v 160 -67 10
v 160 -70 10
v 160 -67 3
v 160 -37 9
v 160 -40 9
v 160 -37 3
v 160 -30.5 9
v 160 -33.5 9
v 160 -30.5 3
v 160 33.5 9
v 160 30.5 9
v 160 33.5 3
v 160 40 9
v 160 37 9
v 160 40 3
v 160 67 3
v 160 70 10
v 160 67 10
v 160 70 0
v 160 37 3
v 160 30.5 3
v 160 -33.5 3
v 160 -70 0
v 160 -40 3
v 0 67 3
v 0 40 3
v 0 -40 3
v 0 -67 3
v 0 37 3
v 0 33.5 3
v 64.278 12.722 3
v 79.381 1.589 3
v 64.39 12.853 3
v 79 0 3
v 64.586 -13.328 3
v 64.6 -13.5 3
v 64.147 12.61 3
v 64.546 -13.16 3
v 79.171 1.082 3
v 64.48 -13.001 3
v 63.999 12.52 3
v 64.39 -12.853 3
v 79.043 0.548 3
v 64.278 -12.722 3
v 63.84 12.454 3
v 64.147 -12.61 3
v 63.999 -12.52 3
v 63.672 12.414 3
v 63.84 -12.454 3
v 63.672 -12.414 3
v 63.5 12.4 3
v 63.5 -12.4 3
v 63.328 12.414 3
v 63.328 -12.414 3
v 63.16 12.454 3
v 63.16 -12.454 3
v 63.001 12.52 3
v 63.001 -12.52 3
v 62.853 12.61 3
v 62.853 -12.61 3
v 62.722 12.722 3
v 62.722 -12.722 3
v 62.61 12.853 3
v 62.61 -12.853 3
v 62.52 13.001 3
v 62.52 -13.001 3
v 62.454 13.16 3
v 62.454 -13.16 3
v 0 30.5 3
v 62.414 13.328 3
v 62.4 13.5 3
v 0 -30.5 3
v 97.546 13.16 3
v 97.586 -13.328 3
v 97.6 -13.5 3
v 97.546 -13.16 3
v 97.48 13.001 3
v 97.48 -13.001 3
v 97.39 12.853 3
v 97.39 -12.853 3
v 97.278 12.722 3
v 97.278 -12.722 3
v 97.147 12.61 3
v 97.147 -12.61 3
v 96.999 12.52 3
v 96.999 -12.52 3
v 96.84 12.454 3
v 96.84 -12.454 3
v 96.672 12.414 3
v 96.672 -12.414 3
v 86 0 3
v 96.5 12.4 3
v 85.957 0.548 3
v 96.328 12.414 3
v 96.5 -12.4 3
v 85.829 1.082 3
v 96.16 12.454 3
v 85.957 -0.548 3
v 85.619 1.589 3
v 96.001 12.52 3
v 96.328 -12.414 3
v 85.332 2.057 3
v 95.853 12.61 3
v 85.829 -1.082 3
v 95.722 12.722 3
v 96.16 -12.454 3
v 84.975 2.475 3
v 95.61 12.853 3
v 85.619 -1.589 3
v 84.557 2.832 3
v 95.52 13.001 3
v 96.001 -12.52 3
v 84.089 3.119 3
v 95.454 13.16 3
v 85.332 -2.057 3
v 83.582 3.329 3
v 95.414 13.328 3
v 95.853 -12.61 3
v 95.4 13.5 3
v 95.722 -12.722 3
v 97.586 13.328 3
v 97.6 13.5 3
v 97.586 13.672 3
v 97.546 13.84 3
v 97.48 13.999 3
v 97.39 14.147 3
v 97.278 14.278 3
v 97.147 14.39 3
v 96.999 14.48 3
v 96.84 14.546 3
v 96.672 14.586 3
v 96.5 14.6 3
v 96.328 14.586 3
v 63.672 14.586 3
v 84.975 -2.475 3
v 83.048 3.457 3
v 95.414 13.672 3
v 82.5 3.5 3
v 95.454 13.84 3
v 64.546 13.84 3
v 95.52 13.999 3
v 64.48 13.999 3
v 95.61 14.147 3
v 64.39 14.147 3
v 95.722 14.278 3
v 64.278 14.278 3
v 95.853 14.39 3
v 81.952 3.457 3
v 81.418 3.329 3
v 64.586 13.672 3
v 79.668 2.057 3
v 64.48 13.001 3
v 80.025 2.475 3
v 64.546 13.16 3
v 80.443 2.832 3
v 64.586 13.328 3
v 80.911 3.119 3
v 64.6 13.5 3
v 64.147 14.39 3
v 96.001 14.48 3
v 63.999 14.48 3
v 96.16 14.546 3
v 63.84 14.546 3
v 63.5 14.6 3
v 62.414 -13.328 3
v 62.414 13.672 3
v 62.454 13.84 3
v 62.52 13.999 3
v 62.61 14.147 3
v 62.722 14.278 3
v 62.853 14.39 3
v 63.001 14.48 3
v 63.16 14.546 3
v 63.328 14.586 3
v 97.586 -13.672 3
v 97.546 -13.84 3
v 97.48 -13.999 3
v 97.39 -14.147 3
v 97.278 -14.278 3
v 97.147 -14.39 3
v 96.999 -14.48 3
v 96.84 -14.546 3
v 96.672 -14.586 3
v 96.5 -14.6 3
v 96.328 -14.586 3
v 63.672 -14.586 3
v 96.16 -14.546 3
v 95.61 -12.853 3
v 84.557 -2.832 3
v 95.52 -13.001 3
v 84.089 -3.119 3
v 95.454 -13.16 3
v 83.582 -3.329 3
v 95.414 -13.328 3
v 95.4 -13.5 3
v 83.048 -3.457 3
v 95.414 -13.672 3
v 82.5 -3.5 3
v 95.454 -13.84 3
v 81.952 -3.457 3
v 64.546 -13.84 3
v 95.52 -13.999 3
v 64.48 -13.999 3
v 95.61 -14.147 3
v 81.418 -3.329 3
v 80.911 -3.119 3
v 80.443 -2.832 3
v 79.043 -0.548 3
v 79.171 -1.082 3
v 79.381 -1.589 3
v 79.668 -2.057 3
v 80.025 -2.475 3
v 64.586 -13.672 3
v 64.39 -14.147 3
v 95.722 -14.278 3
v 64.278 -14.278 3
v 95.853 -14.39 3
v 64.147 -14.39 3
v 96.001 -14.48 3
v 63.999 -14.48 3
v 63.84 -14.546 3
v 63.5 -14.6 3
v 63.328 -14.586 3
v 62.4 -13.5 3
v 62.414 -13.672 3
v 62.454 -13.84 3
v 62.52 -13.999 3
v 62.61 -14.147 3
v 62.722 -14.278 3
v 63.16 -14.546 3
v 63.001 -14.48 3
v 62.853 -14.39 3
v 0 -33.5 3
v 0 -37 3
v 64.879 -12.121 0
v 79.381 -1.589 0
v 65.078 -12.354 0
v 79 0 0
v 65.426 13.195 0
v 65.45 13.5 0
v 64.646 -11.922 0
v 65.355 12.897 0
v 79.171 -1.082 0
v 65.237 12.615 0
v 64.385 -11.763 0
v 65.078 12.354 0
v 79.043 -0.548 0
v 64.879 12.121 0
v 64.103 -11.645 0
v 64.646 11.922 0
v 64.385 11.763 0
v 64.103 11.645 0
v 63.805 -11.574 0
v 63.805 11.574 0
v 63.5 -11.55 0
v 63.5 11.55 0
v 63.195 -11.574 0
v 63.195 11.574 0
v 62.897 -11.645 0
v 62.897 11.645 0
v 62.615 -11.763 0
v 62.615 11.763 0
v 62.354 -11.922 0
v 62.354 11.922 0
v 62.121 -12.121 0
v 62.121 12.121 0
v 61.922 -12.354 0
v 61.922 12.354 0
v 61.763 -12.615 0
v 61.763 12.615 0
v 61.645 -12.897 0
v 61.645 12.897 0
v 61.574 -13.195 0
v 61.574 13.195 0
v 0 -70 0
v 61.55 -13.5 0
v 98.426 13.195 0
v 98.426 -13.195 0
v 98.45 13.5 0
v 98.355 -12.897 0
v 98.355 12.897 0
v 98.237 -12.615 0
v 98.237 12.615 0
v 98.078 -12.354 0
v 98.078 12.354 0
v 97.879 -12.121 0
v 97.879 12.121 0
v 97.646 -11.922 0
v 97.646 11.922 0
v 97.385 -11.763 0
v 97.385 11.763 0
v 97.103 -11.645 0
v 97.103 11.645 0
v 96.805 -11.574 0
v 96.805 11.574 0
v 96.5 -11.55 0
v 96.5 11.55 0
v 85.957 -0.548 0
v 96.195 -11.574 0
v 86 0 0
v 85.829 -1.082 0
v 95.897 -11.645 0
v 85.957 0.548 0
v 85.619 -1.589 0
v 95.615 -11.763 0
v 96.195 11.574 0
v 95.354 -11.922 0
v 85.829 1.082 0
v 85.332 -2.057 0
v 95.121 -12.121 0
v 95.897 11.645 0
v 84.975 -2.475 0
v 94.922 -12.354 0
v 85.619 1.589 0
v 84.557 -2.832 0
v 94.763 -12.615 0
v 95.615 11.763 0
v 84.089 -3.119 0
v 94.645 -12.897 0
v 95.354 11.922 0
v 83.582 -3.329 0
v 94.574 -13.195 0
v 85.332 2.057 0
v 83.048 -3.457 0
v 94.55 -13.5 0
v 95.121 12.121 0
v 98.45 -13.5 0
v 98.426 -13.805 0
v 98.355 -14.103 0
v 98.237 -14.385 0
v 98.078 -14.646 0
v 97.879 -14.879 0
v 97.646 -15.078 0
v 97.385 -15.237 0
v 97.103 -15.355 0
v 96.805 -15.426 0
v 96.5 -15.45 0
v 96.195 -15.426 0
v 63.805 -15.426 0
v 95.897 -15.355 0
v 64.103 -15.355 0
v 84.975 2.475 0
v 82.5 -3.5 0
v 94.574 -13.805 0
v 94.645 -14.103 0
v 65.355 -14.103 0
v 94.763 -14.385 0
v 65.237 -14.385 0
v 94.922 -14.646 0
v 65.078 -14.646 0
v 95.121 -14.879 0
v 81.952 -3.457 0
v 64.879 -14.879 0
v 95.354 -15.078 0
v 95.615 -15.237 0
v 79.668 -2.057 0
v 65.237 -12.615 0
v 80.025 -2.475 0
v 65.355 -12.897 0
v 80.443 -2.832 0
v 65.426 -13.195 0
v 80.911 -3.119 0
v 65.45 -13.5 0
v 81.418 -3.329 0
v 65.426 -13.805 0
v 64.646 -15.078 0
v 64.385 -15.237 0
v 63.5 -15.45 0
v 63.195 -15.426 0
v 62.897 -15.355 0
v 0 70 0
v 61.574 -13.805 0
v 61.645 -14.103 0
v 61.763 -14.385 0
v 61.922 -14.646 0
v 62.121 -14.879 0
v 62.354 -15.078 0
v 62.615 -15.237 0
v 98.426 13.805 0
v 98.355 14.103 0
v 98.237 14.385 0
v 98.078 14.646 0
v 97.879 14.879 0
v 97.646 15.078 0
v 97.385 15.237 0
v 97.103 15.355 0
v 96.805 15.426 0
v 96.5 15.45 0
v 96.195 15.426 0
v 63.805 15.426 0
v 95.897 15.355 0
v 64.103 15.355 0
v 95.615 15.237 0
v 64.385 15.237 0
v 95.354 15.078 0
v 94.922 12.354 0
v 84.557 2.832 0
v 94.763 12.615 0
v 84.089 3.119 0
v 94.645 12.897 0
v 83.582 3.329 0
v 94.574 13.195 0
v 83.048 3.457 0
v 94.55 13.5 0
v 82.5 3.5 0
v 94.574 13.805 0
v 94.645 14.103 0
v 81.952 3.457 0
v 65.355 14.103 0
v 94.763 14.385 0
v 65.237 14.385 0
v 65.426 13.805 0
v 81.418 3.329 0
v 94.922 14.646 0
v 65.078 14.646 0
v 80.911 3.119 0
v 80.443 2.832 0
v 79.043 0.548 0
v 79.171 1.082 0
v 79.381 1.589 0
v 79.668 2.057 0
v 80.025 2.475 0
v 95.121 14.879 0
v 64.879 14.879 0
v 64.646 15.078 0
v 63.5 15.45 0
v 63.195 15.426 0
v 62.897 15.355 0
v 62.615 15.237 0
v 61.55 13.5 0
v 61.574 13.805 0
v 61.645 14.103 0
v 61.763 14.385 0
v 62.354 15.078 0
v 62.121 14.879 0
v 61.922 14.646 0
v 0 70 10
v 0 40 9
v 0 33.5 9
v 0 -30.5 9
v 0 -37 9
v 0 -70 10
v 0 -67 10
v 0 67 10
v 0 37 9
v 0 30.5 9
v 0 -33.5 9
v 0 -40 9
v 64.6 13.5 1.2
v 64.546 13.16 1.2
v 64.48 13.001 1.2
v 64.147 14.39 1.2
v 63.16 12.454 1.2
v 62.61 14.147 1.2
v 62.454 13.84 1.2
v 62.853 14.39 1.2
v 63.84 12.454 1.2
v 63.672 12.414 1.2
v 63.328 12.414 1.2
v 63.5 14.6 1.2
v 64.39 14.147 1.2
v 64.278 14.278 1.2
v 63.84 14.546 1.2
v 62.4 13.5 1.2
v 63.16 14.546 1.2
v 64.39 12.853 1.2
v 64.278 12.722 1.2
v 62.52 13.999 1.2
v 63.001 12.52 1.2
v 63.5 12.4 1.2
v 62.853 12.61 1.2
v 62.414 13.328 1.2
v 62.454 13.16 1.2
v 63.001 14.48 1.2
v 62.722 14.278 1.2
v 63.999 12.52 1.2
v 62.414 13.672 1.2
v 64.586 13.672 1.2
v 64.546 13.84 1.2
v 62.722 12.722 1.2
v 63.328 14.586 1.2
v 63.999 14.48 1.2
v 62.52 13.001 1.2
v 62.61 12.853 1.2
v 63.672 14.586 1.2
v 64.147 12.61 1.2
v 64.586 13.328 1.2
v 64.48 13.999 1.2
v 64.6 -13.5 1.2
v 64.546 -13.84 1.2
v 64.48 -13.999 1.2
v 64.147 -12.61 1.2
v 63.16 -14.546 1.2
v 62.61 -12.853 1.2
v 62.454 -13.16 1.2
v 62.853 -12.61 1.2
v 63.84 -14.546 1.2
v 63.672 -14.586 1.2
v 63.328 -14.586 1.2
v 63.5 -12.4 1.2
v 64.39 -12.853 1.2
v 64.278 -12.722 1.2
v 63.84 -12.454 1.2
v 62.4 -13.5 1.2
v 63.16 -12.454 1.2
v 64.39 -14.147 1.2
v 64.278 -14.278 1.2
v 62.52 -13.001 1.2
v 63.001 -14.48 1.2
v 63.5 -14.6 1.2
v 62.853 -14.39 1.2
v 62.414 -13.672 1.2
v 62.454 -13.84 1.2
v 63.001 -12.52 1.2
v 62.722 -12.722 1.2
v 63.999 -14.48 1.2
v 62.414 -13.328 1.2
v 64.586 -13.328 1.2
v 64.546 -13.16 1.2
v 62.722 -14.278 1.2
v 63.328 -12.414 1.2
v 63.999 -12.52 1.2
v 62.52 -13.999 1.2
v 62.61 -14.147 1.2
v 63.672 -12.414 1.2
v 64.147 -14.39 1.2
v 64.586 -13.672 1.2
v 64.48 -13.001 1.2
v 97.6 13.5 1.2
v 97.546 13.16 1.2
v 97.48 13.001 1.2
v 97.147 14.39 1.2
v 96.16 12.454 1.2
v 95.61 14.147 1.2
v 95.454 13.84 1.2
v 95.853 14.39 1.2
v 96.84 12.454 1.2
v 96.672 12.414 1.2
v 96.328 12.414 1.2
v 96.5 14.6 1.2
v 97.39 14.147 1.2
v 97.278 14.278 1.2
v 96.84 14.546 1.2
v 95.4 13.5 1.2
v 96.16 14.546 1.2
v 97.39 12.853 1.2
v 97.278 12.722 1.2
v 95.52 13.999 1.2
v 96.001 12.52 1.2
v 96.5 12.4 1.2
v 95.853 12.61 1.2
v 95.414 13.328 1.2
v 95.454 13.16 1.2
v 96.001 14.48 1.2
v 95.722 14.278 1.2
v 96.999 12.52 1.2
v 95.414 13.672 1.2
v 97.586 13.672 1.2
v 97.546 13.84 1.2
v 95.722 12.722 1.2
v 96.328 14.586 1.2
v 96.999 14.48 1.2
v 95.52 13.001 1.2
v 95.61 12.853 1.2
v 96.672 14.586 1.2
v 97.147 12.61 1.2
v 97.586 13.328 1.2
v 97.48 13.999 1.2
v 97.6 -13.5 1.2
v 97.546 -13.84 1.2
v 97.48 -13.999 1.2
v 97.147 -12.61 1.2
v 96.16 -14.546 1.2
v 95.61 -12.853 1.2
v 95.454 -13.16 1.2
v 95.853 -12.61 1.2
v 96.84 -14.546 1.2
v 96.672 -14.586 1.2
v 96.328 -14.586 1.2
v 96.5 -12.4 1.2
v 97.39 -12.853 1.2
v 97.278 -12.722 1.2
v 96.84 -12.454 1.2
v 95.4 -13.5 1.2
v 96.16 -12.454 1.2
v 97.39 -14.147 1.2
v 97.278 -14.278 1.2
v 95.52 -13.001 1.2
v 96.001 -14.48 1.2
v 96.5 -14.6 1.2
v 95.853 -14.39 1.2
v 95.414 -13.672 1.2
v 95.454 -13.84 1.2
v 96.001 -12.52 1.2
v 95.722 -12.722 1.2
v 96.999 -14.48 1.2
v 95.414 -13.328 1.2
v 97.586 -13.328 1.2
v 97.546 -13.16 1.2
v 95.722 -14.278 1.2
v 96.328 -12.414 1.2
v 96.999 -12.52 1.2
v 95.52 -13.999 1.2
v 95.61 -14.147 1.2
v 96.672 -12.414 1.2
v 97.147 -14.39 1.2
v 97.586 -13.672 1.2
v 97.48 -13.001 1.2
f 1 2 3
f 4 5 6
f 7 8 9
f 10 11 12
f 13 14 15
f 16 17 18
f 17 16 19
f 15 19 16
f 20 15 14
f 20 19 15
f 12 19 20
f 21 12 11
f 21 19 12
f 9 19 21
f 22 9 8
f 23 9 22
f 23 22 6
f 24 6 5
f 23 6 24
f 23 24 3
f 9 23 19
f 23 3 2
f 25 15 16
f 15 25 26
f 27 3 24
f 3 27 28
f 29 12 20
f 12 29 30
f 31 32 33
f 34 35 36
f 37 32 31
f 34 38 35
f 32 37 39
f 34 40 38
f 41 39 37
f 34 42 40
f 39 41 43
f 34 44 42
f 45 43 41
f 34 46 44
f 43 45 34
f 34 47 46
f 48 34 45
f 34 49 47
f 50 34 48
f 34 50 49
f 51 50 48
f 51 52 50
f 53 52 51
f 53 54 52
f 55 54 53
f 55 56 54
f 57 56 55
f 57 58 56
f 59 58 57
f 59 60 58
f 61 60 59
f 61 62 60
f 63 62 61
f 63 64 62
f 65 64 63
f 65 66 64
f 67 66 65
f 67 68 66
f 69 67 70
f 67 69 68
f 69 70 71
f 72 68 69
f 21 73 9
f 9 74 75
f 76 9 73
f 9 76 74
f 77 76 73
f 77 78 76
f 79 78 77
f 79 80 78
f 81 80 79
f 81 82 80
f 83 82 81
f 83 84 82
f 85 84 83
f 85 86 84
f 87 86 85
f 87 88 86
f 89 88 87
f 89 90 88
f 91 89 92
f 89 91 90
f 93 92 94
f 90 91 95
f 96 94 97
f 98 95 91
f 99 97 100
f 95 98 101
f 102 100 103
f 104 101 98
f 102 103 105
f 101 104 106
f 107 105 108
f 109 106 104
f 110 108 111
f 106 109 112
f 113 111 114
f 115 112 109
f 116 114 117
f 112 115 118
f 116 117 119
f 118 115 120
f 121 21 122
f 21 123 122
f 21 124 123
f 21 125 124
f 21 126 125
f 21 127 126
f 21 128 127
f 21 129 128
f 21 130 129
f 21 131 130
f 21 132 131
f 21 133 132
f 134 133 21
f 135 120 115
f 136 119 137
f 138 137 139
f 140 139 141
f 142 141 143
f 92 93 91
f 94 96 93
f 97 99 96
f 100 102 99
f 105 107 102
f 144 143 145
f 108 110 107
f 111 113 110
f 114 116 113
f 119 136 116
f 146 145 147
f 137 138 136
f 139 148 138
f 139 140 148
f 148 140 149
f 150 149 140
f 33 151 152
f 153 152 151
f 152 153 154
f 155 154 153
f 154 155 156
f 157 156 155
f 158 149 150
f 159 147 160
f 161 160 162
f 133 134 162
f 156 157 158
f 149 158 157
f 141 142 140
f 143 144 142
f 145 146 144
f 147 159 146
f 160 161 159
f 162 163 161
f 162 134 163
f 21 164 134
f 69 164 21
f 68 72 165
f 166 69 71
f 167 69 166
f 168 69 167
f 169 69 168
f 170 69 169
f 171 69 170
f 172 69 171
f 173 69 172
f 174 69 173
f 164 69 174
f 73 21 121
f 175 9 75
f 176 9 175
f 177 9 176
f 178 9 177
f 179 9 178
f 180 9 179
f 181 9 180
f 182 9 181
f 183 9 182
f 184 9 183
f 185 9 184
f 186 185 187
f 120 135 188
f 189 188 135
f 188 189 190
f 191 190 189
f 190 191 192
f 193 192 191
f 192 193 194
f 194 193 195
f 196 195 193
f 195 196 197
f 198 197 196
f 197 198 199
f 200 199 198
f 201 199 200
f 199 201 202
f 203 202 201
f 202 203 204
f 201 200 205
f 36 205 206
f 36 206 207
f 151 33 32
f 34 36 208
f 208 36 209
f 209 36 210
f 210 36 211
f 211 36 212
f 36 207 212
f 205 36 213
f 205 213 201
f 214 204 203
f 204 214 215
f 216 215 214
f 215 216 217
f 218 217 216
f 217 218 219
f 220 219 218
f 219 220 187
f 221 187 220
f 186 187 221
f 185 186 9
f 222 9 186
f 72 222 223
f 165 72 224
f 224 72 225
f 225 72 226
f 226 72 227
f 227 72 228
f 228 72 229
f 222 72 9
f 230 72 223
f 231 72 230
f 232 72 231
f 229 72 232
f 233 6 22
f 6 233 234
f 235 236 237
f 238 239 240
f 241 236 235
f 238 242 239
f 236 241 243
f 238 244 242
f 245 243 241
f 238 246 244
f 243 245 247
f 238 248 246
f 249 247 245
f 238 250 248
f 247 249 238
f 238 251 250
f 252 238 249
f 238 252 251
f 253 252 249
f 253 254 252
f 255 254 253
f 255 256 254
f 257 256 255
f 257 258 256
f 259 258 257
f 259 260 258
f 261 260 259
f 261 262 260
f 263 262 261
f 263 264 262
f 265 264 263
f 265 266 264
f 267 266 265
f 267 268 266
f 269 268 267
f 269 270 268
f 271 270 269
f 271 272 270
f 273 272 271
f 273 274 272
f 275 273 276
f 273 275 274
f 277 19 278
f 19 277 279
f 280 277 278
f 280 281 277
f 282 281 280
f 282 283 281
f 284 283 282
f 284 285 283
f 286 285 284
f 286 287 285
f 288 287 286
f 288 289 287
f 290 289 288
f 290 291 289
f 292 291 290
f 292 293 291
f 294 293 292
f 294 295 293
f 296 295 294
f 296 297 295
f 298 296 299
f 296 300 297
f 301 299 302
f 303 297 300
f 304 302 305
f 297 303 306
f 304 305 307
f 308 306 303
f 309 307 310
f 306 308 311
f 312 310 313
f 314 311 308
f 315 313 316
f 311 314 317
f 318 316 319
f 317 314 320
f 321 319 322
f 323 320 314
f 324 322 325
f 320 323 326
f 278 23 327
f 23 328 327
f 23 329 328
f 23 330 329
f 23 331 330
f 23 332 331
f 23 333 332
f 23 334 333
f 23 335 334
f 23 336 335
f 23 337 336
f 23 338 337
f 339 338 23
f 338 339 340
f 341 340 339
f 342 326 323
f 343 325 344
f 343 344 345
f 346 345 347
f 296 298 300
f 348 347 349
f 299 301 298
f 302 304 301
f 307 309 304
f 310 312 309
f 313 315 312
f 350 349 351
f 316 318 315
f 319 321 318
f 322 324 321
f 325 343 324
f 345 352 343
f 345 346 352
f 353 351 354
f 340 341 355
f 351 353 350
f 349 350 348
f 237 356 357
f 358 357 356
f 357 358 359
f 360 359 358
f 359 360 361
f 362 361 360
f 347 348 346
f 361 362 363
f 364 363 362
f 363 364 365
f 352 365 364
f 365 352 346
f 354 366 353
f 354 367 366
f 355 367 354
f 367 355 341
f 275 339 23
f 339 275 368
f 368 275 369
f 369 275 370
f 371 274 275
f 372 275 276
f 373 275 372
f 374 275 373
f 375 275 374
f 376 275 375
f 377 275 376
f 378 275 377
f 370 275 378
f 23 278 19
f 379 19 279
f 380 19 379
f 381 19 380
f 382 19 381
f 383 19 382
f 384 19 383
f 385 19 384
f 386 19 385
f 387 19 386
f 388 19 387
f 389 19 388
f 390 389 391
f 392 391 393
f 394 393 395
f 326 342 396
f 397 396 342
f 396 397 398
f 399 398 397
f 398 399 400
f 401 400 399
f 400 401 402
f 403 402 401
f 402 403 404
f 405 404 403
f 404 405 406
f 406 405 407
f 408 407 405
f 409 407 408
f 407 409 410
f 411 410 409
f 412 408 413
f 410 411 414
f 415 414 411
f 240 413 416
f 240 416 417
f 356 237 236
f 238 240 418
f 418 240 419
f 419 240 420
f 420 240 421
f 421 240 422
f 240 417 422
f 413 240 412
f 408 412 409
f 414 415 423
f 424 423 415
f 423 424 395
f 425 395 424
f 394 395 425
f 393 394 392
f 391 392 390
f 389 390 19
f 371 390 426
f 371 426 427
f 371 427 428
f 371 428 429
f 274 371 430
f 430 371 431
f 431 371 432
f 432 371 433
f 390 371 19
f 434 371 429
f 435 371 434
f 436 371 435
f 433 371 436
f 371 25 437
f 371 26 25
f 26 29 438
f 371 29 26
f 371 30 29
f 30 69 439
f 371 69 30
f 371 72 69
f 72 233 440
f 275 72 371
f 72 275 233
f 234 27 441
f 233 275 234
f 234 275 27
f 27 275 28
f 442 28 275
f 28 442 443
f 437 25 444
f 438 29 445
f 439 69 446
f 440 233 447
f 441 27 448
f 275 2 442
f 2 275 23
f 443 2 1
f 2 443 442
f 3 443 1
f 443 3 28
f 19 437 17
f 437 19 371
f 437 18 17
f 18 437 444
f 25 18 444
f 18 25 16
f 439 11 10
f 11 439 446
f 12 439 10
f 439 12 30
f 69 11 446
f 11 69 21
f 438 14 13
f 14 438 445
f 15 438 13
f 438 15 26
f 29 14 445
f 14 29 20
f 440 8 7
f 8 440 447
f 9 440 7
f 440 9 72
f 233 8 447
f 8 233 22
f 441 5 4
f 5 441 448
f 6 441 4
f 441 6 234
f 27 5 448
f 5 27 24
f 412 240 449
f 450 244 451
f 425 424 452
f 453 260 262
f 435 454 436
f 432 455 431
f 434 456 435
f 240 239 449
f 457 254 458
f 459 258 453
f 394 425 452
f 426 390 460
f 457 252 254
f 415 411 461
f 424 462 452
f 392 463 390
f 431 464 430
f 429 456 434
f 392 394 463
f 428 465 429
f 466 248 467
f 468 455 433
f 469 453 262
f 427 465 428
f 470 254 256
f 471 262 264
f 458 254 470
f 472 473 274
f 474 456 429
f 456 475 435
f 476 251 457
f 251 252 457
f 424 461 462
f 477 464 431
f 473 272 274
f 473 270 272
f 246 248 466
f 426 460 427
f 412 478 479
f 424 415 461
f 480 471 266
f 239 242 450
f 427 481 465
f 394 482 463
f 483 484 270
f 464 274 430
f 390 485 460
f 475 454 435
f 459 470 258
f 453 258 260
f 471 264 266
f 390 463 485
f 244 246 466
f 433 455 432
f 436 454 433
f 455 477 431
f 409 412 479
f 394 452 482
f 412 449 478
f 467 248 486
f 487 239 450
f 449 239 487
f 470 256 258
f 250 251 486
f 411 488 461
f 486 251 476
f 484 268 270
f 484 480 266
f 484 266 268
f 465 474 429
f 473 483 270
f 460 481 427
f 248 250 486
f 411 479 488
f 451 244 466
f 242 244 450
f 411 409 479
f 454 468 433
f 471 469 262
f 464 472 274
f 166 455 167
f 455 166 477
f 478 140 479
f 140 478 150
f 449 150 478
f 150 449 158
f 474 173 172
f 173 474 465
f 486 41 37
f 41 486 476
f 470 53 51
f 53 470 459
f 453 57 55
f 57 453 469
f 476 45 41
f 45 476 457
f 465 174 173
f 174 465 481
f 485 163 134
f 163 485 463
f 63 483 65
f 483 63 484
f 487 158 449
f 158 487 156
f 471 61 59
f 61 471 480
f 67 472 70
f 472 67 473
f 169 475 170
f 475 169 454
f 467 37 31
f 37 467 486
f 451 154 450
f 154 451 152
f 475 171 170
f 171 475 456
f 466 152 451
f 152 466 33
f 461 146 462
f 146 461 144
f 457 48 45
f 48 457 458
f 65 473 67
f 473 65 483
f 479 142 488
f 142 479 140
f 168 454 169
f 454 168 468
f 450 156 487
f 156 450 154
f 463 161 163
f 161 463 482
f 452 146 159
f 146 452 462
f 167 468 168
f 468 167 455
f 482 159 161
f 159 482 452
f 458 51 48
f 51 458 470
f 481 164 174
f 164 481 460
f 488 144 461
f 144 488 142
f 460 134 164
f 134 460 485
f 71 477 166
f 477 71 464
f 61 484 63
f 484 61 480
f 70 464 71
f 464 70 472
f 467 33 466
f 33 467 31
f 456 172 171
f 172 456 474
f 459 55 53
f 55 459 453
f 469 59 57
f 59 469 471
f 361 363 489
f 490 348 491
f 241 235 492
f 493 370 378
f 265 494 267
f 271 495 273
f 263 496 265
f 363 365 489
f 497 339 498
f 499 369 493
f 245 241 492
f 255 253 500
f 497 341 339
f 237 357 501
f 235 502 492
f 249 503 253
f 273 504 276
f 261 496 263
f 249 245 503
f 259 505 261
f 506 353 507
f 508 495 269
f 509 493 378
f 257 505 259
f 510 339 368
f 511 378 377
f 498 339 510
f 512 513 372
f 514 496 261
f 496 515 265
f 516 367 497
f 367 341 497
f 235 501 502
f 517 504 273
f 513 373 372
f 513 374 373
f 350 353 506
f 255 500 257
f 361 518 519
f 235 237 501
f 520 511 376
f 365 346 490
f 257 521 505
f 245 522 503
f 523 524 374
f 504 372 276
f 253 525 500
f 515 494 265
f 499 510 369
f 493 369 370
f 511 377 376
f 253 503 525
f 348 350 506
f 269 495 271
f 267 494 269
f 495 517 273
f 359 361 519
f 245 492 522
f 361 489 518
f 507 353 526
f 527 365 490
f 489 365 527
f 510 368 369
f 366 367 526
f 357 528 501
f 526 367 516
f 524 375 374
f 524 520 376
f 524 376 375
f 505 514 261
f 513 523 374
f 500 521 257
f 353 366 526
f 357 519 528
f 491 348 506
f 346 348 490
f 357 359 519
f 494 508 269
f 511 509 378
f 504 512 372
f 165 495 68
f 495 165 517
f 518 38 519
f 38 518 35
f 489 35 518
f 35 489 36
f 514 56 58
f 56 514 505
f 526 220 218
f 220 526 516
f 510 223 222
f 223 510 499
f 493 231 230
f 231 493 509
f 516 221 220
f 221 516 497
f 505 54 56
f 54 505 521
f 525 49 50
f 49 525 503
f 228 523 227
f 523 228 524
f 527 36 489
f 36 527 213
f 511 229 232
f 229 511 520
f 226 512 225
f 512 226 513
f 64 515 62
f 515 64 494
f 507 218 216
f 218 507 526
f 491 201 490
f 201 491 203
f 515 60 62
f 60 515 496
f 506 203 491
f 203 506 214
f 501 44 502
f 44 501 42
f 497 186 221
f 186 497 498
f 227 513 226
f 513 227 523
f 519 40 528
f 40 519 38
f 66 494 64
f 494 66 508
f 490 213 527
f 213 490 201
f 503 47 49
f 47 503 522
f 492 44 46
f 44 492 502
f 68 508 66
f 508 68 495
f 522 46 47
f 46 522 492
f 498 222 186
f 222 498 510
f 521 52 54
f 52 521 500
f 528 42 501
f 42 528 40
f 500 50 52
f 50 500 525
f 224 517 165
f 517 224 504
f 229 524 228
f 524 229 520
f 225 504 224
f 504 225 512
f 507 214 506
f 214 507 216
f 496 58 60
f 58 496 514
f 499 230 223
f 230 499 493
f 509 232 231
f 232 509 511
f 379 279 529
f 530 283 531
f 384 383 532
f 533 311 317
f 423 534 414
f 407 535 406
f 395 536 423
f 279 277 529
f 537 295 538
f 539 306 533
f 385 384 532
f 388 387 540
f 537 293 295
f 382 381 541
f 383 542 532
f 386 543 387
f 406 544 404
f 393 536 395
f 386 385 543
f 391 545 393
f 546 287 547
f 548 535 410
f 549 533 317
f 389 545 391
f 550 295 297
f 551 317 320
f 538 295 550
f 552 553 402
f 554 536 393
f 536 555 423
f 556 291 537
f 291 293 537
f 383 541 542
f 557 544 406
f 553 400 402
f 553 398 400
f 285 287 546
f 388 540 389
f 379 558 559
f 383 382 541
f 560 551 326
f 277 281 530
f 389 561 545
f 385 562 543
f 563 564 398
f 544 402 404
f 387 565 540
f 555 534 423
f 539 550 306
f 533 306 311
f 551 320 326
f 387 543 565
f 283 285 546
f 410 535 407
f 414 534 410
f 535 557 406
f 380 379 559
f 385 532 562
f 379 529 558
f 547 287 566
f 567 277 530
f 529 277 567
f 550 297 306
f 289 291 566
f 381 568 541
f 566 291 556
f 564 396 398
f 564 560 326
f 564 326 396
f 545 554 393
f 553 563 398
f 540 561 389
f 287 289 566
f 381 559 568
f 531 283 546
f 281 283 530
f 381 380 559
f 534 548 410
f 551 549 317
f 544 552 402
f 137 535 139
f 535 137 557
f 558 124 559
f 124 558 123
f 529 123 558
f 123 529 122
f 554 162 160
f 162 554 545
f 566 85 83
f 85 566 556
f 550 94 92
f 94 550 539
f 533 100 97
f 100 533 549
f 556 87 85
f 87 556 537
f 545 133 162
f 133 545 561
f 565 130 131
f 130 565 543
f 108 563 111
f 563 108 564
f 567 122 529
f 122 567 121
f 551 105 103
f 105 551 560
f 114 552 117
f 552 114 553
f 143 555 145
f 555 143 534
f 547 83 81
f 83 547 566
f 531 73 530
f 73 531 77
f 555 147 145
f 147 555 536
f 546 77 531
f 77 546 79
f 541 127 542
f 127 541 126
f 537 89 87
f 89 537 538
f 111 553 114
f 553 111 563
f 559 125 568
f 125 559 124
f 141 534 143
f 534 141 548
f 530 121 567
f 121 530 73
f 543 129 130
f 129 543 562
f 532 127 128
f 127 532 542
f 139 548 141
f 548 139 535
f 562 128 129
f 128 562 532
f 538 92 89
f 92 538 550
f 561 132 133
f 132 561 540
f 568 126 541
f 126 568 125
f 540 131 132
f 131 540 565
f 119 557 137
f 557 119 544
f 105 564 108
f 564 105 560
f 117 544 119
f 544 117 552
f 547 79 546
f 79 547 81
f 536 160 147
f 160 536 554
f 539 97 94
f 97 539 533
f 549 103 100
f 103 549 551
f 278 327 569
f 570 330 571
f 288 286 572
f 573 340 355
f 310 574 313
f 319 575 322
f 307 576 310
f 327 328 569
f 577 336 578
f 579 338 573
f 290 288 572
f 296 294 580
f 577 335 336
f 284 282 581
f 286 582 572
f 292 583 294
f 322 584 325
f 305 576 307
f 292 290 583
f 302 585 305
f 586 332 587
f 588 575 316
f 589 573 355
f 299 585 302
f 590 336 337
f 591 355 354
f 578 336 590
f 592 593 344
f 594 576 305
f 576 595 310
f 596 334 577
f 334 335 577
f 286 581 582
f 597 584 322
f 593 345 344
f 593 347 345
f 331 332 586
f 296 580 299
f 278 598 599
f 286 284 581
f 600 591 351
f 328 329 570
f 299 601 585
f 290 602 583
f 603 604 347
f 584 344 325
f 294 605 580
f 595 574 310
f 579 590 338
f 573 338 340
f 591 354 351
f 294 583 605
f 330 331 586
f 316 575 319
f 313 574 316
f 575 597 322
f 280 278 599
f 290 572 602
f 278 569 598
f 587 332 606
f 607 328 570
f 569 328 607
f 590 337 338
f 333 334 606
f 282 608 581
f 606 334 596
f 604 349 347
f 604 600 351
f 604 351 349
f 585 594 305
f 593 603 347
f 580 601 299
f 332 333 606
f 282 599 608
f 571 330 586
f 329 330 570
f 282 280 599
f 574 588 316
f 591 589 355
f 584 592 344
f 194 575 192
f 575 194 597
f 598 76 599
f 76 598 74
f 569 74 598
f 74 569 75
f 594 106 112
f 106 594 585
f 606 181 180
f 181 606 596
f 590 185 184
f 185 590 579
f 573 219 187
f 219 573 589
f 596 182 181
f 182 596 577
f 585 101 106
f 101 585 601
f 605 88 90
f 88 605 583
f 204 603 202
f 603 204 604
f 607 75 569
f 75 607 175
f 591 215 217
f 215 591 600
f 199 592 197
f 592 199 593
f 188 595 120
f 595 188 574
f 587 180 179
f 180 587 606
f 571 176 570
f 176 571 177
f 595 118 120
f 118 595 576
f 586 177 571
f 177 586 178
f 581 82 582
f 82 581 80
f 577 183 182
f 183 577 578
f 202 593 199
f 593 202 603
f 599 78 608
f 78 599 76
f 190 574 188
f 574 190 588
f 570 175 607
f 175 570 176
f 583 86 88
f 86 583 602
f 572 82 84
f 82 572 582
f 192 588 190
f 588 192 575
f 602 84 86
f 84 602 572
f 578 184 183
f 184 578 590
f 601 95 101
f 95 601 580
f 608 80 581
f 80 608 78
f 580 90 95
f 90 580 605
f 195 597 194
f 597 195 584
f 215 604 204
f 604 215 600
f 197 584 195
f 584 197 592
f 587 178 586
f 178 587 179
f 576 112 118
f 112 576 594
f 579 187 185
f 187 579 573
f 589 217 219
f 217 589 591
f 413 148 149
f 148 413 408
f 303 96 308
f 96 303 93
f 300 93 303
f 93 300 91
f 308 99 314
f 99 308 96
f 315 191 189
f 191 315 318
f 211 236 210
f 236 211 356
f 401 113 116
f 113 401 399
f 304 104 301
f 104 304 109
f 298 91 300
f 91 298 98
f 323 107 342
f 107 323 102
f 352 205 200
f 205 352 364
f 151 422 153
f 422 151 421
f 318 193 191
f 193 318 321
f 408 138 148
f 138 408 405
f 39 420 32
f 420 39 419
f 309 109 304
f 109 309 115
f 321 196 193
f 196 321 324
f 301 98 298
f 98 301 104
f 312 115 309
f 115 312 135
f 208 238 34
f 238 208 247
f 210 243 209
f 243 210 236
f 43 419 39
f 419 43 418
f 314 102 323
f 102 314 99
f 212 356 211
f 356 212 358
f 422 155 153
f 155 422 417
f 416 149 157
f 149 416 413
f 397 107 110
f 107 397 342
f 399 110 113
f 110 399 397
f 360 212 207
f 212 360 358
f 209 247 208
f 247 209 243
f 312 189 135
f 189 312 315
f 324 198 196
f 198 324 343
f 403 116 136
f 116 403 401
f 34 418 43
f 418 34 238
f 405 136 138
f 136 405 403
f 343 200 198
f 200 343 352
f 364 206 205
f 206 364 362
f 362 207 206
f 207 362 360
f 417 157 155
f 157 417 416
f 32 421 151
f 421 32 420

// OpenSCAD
$fn = 40;

camera_bb_width = 105;
camera_bb_depth = 60;
camera_bb_height = 64;

rpi_bb_width = 90;
rpi_bb_depth = 58;
rpi_bb_height = 20;

poe_bb_width = 75;
poe_bb_depth = 45;
poe_bb_height = 21;

camera_body_width = 105; //TODO incorrect
camera_body_depth = 52;
camera_body_height = 64;

camera_inset = 10;

camera_lens_width = 105; //TODO incorrect
camera_lens_depth = 60;
camera_lens_height = 60;

wall_thickness = 3;

baseplate_width = 160;
baseplate_depth = 100;
baseplate_height = wall_thickness;

clip_height = 20;
clip_spacing = 0.5;

sideclip_depth = clip_height;
sideclip_height = 10;

topclip_width = baseplate_width;
topclip_depth = baseplate_depth + 2 * sideclip_depth + 2 * wall_thickness;
topclip_height = 30;

module mountinghole() {
  mountinghole_d = 2.2;
  mountinghole_head_d = 3.9;
  mountinghole_head_height = 1.2;
  cylinder(d1 = mountinghole_head_d, d2 = mountinghole_d, h = mountinghole_head_height);
  translate([0, 0, mountinghole_head_height]) cylinder(d = mountinghole_d, h = 10);
}

module baseplate() {
  width = baseplate_width;
  depth = baseplate_depth;
  height = baseplate_height;
  translate([0, - depth / 2, 0]) cube([width, depth, height]);
}

module sideclip() {
  width = baseplate_width;
  height = sideclip_height;
  depth = sideclip_depth;
  translate([0, - baseplate_depth / 2 - depth, 0]) {
    cube([baseplate_width, depth, wall_thickness]);
    cube([baseplate_width, wall_thickness, height]);
  }
}

module mountingclip() {
  width = baseplate_width;
  depth = wall_thickness;
  height = 2 * wall_thickness;
  translate([0, camera_bb_depth / 2 + clip_spacing, wall_thickness]) cube([width, depth, height]);
  translate([0, camera_bb_depth / 2 + 2*clip_spacing + 2*wall_thickness, wall_thickness]) cube([width, depth, height]);
  translate([0, -camera_bb_depth / 2 - clip_spacing - wall_thickness, wall_thickness]) cube([width, depth, height]);
  translate([0, -camera_bb_depth / 2 - 2*clip_spacing - 3*wall_thickness, wall_thickness]) cube([width, depth, height]);
}

module topmountingclip() {
  width = baseplate_width;
  depth = 2 * wall_thickness;
  height = wall_thickness;
  dfromplate = 5;
  translate([0, camera_bb_height / 2 + clip_spacing, -wall_thickness - dfromplate]) cube([width, depth, height]);
  translate([0, camera_bb_height / 2 + clip_spacing, -3*wall_thickness - dfromplate]) cube([width, depth, height]);
  translate([0, camera_bb_height / 2 + 2*wall_thickness, -3*wall_thickness - dfromplate]) cube([width, height, depth + dfromplate + wall_thickness]);

  translate([0, -camera_bb_height / 2 - depth, -wall_thickness - dfromplate]) cube([width, depth, height]);
  translate([0, -camera_bb_height / 2 - depth, -3*wall_thickness - dfromplate]) cube([width, depth, height]);
  translate([0, -camera_bb_height / 2 - 3*wall_thickness, -3*wall_thickness - dfromplate]) cube([width, height, depth + dfromplate + wall_thickness]);
}

module sideclip_inside() {
  translate([0, 2 * wall_thickness + clip_spacing, wall_thickness + clip_spacing]) cube([baseplate_width, wall_thickness, sideclip_height]);
  translate([0, wall_thickness, sideclip_height + clip_spacing]) cube([baseplate_width, 2 * wall_thickness + clip_spacing, wall_thickness]);
  translate([0, 2 * wall_thickness + clip_spacing, camera_body_height + wall_thickness - sideclip_height - clip_spacing]) cube([baseplate_width, wall_thickness, sideclip_height]);
  translate([0, wall_thickness, camera_body_height + wall_thickness - sideclip_height - clip_spacing]) cube([baseplate_width, 2 * wall_thickness + clip_spacing, wall_thickness]);
}

module topplate() {
  module mountingholes_top() {
    x1 = 43.5;
    x2 = x1 + 20 + 28;
    ydistance = 20;
    y1 = ydistance / 2;
    y2 = - ydistance / 2;

    translate([camera_inset, 0, 0]) {
      translate([x1, y1, 0]) mountinghole();
      translate([x1, y2, 0]) mountinghole();
      translate([x2, y1, 0]) mountinghole();
      translate([x2, y2, 0]) mountinghole();
    }
  }
  module cableholes() {
    width = 20;
    depth = 20;
    height = 20;
    translate([baseplate_width - width - width / 2, baseplate_depth / 2 - depth / 2 + 2, -10]) cube([width, depth, height]);
    translate([width / 2, baseplate_depth / 2 - depth / 2 + 2, -10]) cube([width, depth, height]);
    translate([baseplate_width - width - width / 2, -baseplate_depth / 2 - depth / 2 - 2, -10]) cube([width, depth, height]);
    translate([width / 2, -baseplate_depth / 2 - depth / 2 - 2, -10]) cube([width, depth, height]);
  }
  difference() {
    union() {
      baseplate();
      sideclip();
      mirror([0, 1, 0]) sideclip();
      mountingclip();
    }
    mountingholes_top();
    cableholes();
  }
}

module bottomplate() {
  module mountingholes_bottom() {
    x1 = 53.5;
    x2 = x1 + 33;
    ydistance = 27;
    y1 = ydistance / 2;
    y2 = - ydistance / 2;

    translate([camera_inset, 0, 0]) {
      translate([x1, y1, 0]) mountinghole();
      translate([x1, y2, 0]) mountinghole();
      translate([x2, y1, 0]) mountinghole();
      translate([x2, y2, 0]) mountinghole();
    }
  }
  module tripod_hole() {
    x = 72.5;
    y = 0;
    d = 7;
    translate([camera_inset, 0, 0])
      translate([x, y, -5]) cylinder(d = d, h = 10);
  }
  difference() {
    union() {
      baseplate();
      sideclip();
      mirror([0, 1, 0]) sideclip();
      mountingclip();
    }
    mountingholes_bottom();
    tripod_hole();
  }
}

module case_wall() {
  width = baseplate_width;
  depth = baseplate_depth;
  height = camera_body_height + 2 * wall_thickness + topclip_height;

  translate([0, -sideclip_depth - baseplate_depth / 2 - wall_thickness, 0]) {
    cube([width, wall_thickness, height]);
    sideclip_inside();
  }
}

module outter_case() {
  case_wall();
  mirror([0, 1, 0]) case_wall();
  translate([0, - topclip_depth / 2, camera_body_height + 2 * wall_thickness + topclip_height])
    cube([topclip_width, topclip_depth, wall_thickness]);
}

/*translate([0, 0, 2 * wall_thickness + camera_body_height]) rotate([180, 0, 0]) topplate();*/
bottomplate();
/*
color("green") outter_case();

//camera bb
color("blue") translate([camera_inset, - camera_bb_depth / 2, wall_thickness]) cube([camera_bb_width, camera_bb_depth, camera_bb_height]);

//rpi bb
  translate([60,-40, wall_thickness + 3])
rotate([90, 0, 0])
  color("red") {
    cube([rpi_bb_width, rpi_bb_depth, rpi_bb_height]);
    translate([rpi_bb_width - 15, rpi_bb_depth, 1]) cube([10, 40, 10]);
    translate([-52, 5, 1]) cube([52, 52, 18]);
  }

//poe bb
  translate([0,0,-50])
  translate([45,39, 2*poe_bb_depth + 17])
rotate([-90, 0, 0])
  color("red") {
    cube([poe_bb_width, poe_bb_depth, poe_bb_height]);
    translate([poe_bb_width, poe_bb_depth - 10 - 5, 2]) cube([36, 10, 10]);
    translate([-40, 3, 3]) cube([40, 40, 16]);
  }
*/
